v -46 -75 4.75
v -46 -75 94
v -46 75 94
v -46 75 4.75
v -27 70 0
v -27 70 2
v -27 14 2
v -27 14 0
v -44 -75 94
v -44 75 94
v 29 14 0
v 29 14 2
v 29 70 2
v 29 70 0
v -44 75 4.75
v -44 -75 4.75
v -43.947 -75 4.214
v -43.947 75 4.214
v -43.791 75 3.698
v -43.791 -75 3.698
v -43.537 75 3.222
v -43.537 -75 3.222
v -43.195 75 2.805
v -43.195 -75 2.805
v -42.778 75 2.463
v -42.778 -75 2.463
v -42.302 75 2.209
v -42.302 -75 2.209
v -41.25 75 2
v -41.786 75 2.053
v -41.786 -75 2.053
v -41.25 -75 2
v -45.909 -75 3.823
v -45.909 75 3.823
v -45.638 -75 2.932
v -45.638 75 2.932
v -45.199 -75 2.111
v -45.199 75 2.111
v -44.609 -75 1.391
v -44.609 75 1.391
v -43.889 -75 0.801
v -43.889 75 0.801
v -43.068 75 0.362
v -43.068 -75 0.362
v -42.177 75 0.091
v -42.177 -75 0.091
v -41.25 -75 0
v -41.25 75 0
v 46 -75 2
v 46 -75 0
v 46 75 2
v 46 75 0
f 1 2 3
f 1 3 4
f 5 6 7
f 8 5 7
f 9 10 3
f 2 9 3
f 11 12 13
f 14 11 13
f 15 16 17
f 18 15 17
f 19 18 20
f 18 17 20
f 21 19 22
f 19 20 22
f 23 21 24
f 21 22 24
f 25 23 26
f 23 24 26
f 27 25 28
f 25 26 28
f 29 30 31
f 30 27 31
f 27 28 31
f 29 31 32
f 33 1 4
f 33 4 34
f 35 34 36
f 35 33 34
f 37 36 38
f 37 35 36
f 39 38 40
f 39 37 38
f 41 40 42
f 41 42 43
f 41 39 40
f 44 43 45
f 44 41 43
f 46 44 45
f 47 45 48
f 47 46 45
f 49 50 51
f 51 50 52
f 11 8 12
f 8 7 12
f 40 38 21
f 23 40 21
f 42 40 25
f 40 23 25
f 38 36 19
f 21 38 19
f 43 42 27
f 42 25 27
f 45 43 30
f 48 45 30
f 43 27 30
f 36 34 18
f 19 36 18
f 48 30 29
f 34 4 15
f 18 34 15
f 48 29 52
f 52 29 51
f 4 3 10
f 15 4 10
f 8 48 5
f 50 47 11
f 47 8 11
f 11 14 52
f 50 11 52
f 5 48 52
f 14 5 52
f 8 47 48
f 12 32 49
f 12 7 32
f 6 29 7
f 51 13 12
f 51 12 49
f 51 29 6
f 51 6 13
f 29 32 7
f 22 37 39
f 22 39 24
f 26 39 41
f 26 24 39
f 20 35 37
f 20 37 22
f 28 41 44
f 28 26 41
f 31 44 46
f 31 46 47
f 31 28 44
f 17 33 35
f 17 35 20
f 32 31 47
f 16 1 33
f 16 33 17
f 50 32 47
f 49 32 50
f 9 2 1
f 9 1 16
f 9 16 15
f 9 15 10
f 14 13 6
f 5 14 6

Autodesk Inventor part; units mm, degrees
ref_plane "YZ Plane" through (0, 0, 0) normal (1, 0, 0) x (0, 1, 0)
ref_plane "XZ Plane" through (0, 0, 0) normal (0, 1, 0) x (-1, 0, 0)
ref_plane "XY Plane" through (0, 0, 0) normal (0, 0, 1) x (1, 0, 0)
sketch "Sketch1" plane through (0, 0, 0) normal (0, 0, 1) x (1, 0, 0)
  line L0 (-46, -75) -> (46, -75)
  line L1 (46, -75) -> (46, 75)
  line L2 (46, 75) -> (-46, 75)
  line L3 (-46, 75) -> (-46, -75)
  line L4 (-46, -75) -> (46, 75) construction
  line L5 (46, -75) -> (-46, 75) construction
  point P0 (0, 0)
  dimension "d154" = 92
  dimension "d155" = 150
extrude "Plate5" add sketch "Sketch1" along normal blind 2
sketch "Sketch7" plane through (-44, -75, 0) normal (-1, 0, 0) x (0, -1, 0)
  line L0 (-150, 0) -> (0, 0)
  line L1 (0, 0) -> (0, 94)
  line L2 (0, 94) -> (-150, 94)
  line L3 (-150, 94) -> (-150, 0)
edge flange "Flange3" height 94 angle 90 thickness 2 bend radius 2.75 thickness toward (-1, 0, 0) relief round relief width 2 relief depth 1 edges at (-46, 0, 2) wall of the first edge with corners at (-44, 75, 0) (-44, -75, 0) (-44, -75, 94) (-44, 75, 94)
bend "Bend3"
corner "Corner3"
sketch "Sketch8" plane through (0, 0, 2) normal (0, 0, 1) x (1, 0, 0)
  line L0 (46, 75) -> (46, -75) projected
  line L1 (-41.25, 75) -> (46, 75) projected
  line L2 (29, 70) -> (-27, 70)
  line L3 (-27, 70) -> (-27, 14)
  line L4 (-27, 14) -> (29, 14)
  line L5 (29, 14) -> (29, 70)
  line L6 (29, 70) -> (-27, 14) construction
  line L7 (-27, 70) -> (29, 14) construction
  point P0 (0, 0)
  point P1 (1, 42)
  point P2 (2.375, 75)
  dimension "d167" = 56
  dimension "d168" = 56
  dimension "d169" = 5
  dimension "d172" = 17
extrude "Cut1" cut sketch "Sketch8" against normal blind 2
properties part number "APN 752 FDS 1200 FLANGE 2" material "Stainless Steel"
